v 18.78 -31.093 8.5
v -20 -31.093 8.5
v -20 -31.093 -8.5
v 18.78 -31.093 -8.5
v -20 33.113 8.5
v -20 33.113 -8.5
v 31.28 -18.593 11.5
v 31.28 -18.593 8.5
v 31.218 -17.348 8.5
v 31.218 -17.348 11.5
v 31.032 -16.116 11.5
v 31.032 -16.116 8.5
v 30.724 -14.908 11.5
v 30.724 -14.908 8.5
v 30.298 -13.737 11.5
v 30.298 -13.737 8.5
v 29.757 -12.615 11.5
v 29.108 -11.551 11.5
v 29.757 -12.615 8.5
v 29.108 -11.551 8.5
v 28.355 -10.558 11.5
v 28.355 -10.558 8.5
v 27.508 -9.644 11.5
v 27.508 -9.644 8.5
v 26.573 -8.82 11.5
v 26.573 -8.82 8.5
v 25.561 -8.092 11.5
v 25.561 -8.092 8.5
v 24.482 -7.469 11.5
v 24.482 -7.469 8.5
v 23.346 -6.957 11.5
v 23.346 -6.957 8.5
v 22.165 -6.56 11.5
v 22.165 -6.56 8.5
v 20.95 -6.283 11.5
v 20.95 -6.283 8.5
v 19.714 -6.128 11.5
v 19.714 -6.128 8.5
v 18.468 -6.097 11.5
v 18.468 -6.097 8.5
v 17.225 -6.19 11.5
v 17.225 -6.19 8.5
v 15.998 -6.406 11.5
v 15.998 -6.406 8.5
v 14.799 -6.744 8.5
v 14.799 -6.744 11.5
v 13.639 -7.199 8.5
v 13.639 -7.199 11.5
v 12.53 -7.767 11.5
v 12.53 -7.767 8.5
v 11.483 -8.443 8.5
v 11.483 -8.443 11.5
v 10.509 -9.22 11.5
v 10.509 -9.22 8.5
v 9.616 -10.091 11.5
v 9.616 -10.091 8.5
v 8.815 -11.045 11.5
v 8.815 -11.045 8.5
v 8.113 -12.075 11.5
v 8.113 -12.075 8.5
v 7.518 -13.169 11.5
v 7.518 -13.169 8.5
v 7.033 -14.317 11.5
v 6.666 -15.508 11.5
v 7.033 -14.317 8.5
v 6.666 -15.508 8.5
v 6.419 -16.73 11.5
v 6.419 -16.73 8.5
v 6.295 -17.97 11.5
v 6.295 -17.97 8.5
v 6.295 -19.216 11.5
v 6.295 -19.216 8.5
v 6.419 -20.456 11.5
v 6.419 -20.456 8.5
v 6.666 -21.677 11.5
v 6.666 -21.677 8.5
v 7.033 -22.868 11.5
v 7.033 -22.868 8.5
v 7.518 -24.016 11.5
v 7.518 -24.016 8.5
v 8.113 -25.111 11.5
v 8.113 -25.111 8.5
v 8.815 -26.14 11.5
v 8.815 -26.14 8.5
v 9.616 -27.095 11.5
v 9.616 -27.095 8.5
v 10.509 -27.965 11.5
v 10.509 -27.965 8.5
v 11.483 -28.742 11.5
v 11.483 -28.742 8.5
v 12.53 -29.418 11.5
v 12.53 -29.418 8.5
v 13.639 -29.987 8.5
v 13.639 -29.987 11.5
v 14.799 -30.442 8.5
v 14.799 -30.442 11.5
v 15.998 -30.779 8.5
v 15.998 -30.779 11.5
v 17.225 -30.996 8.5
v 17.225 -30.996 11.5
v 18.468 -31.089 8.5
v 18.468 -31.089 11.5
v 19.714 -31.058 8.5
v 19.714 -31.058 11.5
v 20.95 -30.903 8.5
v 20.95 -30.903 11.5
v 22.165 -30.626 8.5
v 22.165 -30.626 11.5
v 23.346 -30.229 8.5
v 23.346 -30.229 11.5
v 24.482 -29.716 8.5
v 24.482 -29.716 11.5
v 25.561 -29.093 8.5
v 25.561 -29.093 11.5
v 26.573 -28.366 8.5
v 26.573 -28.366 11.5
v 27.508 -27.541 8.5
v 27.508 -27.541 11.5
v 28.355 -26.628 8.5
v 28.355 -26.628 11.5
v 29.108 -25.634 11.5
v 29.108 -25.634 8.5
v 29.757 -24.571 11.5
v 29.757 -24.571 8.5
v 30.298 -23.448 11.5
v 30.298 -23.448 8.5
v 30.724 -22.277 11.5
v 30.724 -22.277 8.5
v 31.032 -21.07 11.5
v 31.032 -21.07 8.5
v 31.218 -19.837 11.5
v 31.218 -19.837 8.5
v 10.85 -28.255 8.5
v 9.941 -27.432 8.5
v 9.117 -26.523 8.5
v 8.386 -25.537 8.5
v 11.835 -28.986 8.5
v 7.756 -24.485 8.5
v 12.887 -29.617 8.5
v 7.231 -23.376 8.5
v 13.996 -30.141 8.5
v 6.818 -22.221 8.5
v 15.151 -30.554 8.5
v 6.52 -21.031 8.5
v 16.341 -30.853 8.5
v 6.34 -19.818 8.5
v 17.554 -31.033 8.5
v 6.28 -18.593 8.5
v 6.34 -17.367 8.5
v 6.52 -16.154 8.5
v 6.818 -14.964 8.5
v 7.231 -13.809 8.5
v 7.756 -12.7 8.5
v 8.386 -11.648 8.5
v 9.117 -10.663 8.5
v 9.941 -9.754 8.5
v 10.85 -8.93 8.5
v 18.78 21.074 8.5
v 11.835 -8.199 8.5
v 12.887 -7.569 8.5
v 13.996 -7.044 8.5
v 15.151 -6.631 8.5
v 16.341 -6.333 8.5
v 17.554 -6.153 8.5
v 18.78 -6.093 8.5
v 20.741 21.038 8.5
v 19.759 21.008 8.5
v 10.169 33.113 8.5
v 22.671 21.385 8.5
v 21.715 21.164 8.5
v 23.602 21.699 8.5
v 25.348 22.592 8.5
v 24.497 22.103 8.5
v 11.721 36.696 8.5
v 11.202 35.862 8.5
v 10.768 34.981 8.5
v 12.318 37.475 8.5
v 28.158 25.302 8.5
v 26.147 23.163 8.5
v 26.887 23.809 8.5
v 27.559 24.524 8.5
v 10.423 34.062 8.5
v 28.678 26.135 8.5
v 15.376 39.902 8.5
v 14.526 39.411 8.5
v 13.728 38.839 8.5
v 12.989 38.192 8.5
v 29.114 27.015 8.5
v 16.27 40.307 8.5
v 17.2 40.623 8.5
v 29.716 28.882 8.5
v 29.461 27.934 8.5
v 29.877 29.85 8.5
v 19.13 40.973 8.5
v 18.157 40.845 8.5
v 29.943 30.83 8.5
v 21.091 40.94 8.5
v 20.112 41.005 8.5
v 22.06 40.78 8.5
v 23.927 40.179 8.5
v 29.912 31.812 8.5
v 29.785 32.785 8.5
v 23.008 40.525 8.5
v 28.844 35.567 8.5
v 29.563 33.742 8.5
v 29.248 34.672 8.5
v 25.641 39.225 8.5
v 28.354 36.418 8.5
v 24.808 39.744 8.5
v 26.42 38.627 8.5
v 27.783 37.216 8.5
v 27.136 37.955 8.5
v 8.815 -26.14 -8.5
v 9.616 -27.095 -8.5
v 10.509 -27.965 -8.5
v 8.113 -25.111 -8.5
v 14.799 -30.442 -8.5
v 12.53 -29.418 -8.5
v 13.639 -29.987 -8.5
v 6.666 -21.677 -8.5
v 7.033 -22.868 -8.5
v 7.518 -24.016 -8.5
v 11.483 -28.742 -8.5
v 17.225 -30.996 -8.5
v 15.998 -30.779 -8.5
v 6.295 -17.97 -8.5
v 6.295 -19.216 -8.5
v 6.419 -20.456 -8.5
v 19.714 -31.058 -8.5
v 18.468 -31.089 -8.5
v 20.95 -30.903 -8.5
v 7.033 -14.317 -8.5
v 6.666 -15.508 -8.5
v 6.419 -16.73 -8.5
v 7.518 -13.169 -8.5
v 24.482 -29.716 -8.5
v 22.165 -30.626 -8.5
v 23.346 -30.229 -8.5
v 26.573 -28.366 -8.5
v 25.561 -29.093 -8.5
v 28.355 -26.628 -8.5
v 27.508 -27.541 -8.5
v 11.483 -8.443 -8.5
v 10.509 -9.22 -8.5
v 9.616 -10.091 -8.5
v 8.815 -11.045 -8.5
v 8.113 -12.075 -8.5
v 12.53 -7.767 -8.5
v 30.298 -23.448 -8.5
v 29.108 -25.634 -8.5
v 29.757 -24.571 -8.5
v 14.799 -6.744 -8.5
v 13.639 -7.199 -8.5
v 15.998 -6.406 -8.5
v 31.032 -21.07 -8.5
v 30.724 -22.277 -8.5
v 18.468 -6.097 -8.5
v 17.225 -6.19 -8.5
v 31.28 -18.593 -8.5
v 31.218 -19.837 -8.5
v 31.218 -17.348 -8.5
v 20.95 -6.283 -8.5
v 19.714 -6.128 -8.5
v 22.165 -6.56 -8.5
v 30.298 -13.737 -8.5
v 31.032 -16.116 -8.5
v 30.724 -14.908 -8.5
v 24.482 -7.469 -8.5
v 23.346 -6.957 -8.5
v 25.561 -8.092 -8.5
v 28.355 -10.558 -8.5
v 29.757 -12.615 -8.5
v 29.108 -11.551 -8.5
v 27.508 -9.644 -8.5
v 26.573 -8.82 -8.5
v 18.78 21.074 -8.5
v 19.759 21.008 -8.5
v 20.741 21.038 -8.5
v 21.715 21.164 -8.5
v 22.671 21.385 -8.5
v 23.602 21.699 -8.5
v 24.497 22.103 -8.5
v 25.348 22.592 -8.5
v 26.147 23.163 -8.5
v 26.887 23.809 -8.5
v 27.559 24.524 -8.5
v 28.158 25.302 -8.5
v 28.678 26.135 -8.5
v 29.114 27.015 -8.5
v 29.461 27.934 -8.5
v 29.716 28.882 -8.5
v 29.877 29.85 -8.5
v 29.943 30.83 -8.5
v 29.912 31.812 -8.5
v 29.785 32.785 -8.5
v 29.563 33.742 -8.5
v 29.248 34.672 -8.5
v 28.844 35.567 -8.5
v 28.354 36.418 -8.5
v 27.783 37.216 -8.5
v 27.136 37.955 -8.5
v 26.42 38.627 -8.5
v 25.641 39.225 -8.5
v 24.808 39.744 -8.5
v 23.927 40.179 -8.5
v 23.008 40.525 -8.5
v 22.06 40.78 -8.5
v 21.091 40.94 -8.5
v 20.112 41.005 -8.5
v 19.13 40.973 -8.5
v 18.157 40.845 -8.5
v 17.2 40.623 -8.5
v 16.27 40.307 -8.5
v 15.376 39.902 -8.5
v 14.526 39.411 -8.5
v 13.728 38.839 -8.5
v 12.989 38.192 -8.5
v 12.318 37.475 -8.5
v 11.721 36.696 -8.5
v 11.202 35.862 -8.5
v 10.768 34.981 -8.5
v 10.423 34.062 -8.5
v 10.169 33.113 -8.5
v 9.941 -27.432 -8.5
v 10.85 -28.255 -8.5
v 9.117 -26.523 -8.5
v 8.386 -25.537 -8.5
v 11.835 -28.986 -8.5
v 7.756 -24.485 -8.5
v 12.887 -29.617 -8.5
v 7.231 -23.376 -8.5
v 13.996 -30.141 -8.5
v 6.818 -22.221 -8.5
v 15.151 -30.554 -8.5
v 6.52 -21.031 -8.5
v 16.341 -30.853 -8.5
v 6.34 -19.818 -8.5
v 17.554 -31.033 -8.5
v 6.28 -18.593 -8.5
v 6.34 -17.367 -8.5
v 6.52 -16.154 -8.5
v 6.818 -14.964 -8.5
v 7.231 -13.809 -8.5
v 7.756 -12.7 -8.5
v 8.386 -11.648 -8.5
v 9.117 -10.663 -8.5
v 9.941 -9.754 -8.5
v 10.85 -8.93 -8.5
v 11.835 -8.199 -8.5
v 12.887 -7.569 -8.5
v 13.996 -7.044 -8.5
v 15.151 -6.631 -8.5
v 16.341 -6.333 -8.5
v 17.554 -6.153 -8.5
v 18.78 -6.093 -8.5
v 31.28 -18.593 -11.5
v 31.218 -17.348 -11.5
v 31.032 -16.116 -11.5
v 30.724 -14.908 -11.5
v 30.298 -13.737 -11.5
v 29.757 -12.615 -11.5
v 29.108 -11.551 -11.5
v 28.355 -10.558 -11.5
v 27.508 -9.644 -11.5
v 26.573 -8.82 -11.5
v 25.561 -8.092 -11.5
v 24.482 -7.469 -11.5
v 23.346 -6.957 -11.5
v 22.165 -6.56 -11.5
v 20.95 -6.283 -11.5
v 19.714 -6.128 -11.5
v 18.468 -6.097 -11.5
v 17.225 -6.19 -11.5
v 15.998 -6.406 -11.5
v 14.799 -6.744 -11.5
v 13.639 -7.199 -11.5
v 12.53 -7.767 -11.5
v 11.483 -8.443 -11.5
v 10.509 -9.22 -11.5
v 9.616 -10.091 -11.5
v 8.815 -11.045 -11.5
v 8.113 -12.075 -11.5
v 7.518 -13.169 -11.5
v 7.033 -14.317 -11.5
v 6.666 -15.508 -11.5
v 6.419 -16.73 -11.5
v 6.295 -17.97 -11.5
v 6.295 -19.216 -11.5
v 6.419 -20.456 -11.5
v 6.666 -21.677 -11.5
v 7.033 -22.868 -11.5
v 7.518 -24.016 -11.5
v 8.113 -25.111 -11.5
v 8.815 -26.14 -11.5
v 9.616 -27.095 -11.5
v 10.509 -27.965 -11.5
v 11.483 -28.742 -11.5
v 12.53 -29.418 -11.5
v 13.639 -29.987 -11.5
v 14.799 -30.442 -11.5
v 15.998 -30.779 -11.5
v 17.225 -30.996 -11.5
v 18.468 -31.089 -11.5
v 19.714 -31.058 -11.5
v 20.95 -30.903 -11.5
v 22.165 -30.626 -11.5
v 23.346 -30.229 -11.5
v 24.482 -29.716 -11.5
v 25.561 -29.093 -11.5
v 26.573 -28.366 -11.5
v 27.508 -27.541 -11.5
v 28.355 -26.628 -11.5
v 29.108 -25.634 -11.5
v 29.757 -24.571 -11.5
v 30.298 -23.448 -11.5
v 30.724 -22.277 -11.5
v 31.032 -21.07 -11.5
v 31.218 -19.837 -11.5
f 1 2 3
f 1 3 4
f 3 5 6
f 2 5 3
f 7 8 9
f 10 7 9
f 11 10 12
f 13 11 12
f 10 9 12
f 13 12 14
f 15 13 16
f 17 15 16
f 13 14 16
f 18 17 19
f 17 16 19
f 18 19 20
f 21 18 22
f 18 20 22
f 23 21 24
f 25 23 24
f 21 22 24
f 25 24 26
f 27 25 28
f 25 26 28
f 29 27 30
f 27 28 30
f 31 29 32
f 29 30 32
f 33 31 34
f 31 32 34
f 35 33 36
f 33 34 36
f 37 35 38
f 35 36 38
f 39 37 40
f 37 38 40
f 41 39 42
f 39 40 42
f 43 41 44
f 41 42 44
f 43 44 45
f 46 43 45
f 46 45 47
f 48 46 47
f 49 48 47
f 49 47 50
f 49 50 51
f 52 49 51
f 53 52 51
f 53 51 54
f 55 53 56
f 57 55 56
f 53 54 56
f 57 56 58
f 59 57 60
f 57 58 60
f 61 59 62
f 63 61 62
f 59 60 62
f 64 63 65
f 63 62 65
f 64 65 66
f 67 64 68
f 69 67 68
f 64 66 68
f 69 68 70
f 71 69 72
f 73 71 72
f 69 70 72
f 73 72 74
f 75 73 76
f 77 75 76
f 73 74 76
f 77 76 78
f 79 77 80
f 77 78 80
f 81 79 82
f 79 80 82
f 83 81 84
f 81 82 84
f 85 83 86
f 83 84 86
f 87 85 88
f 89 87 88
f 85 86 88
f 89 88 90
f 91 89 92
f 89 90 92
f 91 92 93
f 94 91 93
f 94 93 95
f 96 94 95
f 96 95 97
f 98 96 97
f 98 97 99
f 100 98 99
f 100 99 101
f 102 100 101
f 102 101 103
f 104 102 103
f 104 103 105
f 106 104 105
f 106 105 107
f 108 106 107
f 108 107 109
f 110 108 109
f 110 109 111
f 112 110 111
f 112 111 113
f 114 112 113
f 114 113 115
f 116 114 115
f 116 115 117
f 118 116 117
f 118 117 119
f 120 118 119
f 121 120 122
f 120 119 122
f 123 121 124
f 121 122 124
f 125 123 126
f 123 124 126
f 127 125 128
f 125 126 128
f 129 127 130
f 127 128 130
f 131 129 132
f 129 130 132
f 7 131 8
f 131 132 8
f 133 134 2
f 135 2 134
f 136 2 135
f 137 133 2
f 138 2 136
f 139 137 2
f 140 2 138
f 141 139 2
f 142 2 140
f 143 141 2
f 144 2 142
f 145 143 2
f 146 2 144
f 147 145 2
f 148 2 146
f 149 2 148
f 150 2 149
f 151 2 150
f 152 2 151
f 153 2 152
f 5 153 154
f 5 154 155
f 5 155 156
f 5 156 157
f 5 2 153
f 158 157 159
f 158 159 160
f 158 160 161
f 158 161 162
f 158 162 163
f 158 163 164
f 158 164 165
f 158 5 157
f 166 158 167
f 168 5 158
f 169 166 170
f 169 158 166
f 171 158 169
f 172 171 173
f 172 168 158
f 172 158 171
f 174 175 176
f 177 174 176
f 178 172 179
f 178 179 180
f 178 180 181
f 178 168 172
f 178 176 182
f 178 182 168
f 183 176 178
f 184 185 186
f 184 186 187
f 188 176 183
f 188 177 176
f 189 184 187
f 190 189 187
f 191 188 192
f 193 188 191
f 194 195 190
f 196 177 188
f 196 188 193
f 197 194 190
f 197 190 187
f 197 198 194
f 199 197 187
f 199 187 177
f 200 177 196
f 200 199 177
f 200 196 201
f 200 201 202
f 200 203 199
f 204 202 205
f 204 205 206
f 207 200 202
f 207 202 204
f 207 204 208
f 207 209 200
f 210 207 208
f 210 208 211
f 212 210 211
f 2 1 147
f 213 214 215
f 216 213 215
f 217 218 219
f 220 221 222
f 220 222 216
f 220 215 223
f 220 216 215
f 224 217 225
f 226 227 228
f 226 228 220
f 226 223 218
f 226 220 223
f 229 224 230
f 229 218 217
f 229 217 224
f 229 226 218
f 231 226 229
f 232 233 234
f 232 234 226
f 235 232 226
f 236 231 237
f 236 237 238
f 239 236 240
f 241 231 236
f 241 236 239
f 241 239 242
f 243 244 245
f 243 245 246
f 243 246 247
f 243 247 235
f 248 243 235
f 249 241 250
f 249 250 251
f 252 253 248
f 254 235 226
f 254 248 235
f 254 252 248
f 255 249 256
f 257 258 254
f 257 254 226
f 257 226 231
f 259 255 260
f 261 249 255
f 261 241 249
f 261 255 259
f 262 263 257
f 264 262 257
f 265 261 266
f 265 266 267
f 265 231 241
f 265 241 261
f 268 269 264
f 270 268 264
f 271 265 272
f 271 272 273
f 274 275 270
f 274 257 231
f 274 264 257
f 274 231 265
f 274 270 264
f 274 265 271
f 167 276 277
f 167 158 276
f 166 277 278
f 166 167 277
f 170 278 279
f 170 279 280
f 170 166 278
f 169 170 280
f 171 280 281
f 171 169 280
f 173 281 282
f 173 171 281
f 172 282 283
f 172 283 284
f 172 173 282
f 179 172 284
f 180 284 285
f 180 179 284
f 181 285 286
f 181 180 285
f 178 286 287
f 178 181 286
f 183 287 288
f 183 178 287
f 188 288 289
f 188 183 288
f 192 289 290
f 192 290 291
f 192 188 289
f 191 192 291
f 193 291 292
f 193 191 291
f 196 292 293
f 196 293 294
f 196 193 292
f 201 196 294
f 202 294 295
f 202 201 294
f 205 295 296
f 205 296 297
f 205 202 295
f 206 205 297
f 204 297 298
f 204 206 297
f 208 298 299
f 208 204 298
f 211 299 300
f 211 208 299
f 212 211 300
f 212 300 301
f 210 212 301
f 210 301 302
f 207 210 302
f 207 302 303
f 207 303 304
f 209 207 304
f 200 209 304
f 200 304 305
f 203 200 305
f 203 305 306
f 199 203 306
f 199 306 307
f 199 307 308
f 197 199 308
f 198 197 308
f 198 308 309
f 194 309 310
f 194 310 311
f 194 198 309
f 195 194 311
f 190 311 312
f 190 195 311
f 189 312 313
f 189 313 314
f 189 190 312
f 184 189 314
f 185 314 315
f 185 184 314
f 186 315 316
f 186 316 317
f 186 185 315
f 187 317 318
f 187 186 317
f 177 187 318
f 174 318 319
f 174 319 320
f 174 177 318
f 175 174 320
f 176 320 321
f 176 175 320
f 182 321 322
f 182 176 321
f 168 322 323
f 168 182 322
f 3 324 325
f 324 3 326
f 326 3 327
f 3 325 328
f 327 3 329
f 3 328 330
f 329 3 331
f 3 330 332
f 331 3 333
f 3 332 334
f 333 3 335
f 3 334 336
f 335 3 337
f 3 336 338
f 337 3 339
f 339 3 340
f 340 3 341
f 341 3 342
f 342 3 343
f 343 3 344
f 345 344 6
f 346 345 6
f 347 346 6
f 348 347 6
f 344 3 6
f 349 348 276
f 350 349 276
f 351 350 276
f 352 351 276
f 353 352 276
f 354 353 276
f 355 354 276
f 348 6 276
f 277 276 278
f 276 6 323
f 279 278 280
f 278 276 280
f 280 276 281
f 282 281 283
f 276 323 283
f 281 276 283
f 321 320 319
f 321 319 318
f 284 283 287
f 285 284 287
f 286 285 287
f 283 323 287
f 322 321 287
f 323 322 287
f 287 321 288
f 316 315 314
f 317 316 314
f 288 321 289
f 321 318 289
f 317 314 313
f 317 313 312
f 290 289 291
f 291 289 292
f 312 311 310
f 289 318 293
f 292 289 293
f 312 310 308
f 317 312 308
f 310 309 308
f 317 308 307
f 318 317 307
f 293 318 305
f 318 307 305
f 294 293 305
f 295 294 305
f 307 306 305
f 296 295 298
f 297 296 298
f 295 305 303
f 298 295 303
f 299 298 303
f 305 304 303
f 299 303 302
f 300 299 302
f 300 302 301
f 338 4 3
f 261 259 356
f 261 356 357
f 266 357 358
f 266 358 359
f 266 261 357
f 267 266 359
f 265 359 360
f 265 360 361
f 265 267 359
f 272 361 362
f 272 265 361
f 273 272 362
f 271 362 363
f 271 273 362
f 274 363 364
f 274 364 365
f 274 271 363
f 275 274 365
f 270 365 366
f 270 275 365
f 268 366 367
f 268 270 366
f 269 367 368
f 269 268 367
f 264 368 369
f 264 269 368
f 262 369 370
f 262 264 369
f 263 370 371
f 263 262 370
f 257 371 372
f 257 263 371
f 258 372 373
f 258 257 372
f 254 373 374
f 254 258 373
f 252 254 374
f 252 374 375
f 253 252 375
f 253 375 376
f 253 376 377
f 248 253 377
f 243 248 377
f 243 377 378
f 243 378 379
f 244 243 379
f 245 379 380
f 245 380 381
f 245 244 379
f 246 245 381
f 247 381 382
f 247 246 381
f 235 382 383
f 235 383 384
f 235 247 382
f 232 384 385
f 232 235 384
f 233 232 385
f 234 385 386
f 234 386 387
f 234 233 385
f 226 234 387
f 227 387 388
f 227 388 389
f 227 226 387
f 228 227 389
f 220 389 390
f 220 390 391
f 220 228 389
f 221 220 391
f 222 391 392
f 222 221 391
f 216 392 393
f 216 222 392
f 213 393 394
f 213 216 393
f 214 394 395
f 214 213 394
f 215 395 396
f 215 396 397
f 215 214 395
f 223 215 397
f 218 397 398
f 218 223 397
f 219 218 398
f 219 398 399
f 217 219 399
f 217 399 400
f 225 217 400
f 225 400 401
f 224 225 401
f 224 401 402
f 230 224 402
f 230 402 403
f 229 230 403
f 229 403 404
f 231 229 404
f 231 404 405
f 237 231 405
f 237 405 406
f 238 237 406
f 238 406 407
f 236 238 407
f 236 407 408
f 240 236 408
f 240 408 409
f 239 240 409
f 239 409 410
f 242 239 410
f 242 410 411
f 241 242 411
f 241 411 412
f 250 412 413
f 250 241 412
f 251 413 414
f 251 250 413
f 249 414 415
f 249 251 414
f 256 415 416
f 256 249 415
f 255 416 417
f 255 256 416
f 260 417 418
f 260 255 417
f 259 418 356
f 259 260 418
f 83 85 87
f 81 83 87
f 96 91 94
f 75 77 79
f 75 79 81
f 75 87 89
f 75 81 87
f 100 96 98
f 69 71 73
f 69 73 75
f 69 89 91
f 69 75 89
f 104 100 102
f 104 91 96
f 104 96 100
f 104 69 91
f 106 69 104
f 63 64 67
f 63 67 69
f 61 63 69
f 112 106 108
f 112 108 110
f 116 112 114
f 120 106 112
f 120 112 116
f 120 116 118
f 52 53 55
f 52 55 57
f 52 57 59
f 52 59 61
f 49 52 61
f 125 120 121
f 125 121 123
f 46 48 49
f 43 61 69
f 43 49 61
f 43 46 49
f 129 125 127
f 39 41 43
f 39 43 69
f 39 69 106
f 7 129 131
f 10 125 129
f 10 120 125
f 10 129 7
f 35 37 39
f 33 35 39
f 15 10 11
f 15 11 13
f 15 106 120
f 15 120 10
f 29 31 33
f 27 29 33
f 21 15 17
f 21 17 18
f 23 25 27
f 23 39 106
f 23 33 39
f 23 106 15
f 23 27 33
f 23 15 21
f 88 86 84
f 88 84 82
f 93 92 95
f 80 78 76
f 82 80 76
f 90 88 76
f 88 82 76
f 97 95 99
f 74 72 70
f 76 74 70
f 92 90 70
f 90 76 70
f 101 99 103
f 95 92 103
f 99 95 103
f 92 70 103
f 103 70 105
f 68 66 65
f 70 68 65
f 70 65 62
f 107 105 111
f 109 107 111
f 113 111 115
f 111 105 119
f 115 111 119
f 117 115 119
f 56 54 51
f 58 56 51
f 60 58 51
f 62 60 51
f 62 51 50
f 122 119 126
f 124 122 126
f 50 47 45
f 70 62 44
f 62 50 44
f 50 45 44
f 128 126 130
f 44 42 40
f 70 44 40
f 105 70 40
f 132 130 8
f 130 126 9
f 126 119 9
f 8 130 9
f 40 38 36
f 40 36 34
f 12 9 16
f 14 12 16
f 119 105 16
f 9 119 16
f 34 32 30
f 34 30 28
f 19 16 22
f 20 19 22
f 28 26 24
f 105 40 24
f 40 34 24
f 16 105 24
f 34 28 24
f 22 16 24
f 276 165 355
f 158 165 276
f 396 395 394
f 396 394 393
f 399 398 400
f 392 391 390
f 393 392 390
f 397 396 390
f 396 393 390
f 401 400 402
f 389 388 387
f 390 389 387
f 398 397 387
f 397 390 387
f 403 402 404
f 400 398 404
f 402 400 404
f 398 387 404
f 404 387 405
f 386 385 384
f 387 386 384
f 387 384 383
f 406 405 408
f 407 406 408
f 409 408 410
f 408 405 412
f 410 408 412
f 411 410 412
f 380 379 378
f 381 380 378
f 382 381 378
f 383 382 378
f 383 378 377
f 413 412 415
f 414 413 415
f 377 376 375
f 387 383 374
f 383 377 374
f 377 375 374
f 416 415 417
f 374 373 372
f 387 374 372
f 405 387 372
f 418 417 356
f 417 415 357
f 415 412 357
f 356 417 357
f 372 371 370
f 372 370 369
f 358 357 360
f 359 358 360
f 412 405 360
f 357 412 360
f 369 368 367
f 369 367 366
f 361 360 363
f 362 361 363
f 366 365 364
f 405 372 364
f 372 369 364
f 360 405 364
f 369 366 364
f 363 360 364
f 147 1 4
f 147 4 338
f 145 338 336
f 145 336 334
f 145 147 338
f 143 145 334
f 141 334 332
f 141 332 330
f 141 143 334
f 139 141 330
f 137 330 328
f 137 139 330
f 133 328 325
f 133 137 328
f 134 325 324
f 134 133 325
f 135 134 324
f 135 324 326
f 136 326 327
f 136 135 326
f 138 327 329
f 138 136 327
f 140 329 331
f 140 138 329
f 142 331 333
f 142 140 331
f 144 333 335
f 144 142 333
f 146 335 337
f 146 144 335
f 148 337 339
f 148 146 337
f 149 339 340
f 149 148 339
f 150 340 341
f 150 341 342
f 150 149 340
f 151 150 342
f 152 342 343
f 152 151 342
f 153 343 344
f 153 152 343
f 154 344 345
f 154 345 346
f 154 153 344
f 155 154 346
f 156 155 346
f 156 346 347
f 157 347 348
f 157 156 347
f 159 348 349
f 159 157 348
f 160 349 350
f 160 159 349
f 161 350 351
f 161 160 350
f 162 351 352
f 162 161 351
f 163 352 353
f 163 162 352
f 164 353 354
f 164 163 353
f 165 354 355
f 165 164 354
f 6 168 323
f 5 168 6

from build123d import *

# Parameters (mm, degrees)
SALIENTE_EXTRUIR1_DEPTH = 8.5
CROQUIS2_R              = 12.5
SALIENTE_EXTRUIR2_DEPTH = 3


with BuildPart() as part:
    # Croquis1 → Saliente-Extruir1 (new, symmetric)
    with BuildSketch(Plane.XY):
        with BuildLine():
            Line((-20, 33.113225815), (-20, -31.092697389))
            Line((-20, -31.092697389), (18.77962453, -31.092697389))
            ThreePointArc((18.77962453, -31.092697389), (6.27962453, -18.592697389), (18.77962453, -6.092697389))
            Line((18.77962453, -6.092697389), (18.77962453, 21.074454159))
            ThreePointArc((18.77962453, 21.074454159), (28.078113499, 36.823933556), (10.168935783, 33.113225815))
            Line((10.168935783, 33.113225815), (-20, 33.113225815))
        make_face()
    extrude(amount=SALIENTE_EXTRUIR1_DEPTH, both=True)


with BuildPart() as body_2:
    # Croquis2 → Saliente-Extruir2 (new body)
    with BuildSketch(Plane.XY.offset(8.5)):
        with Locations((18.77962453, -18.592697389)):
            Circle(CROQUIS2_R)
    extrude(amount=SALIENTE_EXTRUIR2_DEPTH)


with BuildPart() as body_3:
    # Simetría2: mirrored copy
    add(body_2.part.mirror(Plane(origin=(0, 0, 0), x_dir=(1, 0, 0), z_dir=(0, 0, -1))))


solid = Compound([part.part, body_2.part, body_3.part])
